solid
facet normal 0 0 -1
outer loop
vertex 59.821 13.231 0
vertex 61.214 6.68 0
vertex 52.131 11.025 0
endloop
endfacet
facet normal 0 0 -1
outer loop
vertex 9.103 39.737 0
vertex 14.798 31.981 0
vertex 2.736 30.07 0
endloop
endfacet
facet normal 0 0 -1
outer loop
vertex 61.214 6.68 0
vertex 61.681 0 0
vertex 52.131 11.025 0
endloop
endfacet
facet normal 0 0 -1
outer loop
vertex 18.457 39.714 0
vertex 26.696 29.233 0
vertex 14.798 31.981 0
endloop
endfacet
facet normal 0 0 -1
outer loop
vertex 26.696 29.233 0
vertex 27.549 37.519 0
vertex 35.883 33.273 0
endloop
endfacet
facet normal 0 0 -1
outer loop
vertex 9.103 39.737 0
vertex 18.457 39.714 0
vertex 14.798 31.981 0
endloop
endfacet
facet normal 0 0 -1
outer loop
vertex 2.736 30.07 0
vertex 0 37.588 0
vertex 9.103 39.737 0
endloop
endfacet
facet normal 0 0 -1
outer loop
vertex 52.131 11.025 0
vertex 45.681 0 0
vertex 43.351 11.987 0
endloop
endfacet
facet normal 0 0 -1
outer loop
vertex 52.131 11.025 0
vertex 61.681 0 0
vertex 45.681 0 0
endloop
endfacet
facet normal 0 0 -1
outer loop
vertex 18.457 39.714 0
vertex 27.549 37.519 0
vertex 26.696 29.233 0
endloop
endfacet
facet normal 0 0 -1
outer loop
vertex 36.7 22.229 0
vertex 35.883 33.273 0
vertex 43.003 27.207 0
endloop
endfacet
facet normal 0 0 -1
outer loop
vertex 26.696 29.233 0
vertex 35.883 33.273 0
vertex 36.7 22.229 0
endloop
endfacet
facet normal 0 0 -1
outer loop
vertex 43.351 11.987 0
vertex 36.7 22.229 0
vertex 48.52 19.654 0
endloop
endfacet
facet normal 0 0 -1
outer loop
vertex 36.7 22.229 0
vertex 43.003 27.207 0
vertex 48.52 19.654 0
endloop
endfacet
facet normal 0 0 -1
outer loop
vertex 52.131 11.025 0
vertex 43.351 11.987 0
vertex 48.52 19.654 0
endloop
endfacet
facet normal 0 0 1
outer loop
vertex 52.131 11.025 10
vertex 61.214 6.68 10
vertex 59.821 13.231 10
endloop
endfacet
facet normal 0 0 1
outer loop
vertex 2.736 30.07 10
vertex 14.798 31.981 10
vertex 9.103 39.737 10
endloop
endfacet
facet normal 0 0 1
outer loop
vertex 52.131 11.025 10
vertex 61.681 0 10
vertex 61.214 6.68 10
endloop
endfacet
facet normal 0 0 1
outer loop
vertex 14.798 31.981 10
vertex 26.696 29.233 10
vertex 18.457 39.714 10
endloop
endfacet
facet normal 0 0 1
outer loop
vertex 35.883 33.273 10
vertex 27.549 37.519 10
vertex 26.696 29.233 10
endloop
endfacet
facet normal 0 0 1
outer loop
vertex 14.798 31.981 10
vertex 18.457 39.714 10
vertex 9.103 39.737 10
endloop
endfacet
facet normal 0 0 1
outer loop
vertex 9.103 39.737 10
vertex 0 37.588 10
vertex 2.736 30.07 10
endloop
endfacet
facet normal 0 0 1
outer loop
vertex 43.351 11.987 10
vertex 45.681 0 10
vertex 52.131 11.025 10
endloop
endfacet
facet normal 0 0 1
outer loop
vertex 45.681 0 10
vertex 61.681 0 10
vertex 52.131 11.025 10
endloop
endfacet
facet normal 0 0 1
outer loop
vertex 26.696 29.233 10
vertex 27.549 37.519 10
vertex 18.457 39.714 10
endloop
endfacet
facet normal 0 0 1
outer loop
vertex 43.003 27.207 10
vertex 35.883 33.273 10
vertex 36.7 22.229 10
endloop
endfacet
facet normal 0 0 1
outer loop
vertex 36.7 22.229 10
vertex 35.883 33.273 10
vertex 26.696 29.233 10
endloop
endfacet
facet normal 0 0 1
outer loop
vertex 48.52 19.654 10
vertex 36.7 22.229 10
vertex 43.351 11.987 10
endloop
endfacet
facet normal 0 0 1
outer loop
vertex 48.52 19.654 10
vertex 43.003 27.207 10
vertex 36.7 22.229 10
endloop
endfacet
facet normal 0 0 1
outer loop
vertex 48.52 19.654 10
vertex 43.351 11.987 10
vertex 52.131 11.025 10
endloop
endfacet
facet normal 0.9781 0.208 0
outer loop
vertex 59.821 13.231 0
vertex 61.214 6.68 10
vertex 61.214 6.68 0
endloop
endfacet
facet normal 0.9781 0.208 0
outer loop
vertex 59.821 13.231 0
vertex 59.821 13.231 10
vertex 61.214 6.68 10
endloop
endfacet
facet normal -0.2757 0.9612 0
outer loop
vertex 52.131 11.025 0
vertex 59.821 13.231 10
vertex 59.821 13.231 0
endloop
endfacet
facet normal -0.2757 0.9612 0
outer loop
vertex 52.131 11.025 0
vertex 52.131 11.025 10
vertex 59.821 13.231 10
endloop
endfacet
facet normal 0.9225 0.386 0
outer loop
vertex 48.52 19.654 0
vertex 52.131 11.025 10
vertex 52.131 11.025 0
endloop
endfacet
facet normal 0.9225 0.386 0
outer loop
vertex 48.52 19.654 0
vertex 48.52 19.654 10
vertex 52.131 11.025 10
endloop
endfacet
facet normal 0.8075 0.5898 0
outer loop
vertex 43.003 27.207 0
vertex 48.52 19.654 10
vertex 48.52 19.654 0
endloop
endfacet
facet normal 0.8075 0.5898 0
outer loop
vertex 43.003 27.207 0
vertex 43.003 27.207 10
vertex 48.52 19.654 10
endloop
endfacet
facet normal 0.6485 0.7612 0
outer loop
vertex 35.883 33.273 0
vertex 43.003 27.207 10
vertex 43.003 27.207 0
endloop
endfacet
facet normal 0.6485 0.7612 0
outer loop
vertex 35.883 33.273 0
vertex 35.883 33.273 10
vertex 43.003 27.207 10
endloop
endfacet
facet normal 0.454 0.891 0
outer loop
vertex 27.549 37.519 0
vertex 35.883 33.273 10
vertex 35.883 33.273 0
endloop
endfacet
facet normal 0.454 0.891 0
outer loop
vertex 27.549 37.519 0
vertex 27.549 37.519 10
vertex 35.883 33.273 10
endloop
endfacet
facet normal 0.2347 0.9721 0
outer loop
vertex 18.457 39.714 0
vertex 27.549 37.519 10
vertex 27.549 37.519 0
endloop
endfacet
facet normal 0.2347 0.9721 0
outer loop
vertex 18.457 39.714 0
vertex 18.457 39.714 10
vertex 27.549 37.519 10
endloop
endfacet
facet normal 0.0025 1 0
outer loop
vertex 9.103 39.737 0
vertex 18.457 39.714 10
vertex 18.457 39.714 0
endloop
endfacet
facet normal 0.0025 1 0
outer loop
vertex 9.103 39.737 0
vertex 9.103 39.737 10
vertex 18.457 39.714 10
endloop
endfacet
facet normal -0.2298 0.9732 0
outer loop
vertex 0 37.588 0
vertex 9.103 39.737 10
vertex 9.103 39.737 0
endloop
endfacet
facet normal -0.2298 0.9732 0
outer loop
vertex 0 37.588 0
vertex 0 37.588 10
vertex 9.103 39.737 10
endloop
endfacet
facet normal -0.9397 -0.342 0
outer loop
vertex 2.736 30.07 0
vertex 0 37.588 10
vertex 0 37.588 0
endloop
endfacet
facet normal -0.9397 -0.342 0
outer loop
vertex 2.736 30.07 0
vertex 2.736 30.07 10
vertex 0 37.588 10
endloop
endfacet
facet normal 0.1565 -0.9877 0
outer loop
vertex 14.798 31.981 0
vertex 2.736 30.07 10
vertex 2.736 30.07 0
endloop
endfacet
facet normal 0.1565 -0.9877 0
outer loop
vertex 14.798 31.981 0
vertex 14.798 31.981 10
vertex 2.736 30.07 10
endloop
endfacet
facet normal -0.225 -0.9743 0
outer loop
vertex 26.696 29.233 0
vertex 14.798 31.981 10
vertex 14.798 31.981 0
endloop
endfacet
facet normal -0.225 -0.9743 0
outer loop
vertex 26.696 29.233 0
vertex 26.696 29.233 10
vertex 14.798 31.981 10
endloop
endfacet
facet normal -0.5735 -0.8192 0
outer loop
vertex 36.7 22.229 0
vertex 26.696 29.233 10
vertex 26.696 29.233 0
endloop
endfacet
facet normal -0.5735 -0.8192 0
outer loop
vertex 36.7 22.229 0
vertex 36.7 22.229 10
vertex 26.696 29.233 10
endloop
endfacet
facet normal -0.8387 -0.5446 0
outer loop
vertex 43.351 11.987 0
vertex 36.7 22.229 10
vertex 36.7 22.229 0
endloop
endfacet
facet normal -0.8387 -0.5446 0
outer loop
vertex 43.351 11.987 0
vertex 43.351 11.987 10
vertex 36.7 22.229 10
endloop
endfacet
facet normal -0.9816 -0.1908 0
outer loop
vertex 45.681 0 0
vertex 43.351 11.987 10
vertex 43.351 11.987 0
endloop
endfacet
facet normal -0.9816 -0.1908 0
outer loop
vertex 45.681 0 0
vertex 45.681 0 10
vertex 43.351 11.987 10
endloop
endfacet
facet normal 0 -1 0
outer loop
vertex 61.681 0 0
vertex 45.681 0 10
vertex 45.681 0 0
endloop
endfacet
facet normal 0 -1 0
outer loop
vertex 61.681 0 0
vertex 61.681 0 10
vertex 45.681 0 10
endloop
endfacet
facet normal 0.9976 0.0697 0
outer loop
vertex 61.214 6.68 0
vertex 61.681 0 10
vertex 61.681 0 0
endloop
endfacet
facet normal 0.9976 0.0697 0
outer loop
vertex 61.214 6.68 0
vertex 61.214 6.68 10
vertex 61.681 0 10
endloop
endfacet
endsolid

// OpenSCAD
$fn = 32;

// ----------------------------------------------------------------------
// Arc stop: segment, 10 mm thick
// ----------------------------------------------------------------------

// --- parameters (mm) ---
profile_height = 10;      // extrusion height
profile_points = 17;      // points of the closed outline

profile = [[61.681, 0], [61.214, 6.68], [59.821, 13.231], [52.131, 11.025], [48.52, 19.654], [43.003, 27.207], [35.883, 33.273], [27.549, 37.519], [18.457, 39.714], [9.103, 39.737], [0, 37.588], [2.736, 30.07], [14.798, 31.981], [26.696, 29.233], [36.7, 22.229], [43.351, 11.987], [45.681, 0]];  // single closed polygon, 17 points, counter clockwise

// --- the one profile operation ---
linear_extrude(height = profile_height) polygon(points = profile);
